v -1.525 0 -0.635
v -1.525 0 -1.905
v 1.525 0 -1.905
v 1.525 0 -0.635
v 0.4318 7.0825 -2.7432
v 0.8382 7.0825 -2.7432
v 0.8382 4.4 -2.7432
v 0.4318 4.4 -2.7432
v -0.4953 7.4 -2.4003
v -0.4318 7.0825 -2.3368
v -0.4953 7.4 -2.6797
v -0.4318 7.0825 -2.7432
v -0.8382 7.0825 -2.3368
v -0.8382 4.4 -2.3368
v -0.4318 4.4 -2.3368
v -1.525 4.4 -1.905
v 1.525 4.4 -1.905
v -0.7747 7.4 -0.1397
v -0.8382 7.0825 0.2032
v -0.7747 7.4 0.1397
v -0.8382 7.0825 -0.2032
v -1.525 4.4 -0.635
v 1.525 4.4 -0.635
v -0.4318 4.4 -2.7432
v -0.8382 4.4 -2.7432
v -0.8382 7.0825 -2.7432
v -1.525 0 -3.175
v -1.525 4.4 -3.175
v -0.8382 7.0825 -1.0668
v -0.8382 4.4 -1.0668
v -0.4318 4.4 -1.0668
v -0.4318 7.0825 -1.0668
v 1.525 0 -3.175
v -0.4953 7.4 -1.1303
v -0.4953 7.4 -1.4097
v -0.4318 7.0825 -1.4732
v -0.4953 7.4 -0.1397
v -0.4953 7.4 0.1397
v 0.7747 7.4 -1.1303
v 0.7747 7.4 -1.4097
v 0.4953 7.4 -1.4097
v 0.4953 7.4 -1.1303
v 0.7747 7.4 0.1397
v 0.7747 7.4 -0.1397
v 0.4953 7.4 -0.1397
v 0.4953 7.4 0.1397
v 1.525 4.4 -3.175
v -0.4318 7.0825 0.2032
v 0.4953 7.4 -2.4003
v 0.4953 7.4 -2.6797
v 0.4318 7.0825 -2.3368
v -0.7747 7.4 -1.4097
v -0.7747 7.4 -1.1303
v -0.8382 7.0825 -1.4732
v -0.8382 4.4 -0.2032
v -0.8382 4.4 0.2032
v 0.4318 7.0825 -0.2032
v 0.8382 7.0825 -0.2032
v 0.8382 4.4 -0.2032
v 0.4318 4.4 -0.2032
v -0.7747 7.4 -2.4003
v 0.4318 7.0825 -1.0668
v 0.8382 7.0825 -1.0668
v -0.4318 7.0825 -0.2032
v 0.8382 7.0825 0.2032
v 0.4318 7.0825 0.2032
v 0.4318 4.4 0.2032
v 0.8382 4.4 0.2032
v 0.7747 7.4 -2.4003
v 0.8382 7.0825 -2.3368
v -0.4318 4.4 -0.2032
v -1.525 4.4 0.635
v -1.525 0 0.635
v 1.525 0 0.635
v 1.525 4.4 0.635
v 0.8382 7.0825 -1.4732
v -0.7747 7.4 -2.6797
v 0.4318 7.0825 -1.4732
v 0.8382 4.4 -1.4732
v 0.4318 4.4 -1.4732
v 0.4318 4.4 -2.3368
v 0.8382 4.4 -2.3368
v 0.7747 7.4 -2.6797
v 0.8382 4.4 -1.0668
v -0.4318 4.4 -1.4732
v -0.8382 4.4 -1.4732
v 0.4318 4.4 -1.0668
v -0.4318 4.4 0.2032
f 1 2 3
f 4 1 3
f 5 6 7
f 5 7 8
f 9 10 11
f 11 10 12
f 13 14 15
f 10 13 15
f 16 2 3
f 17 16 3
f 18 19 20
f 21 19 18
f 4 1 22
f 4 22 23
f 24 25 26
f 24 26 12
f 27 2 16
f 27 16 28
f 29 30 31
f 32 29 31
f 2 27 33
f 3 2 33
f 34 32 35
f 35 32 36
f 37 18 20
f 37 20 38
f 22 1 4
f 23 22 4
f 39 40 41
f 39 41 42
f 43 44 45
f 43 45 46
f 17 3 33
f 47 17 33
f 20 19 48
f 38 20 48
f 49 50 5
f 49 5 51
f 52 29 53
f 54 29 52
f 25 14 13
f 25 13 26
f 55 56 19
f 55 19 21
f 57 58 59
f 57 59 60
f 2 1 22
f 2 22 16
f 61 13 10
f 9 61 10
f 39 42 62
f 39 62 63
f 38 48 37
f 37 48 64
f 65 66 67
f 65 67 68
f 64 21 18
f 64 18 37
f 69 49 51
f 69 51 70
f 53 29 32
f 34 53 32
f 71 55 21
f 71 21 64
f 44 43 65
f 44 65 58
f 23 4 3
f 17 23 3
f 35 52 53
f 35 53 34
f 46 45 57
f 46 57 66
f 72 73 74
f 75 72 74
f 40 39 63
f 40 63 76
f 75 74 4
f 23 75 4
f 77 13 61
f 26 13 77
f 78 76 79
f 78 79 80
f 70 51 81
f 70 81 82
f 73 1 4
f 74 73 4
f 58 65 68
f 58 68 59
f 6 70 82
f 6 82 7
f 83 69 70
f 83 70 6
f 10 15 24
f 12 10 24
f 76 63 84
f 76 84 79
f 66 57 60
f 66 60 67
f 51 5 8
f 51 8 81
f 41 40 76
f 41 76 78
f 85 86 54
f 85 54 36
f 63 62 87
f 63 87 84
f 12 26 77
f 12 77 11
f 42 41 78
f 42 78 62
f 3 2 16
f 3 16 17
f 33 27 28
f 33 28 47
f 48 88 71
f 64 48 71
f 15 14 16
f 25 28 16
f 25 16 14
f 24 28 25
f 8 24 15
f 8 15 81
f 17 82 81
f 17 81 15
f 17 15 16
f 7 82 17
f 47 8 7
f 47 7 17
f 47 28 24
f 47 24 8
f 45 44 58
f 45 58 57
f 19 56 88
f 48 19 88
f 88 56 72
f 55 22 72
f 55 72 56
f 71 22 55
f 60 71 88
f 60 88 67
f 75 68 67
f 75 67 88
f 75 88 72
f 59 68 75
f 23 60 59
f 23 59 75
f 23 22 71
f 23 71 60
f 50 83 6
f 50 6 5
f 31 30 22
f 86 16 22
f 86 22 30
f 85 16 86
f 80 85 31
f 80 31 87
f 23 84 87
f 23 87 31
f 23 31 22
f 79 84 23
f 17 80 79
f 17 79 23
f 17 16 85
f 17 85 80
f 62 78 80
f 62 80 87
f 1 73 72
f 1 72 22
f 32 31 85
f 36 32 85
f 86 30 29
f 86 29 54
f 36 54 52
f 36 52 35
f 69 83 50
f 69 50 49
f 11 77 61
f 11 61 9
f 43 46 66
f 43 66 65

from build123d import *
from OCP.BRepFilletAPI import BRepFilletAPI_MakeChamfer

# Parameters (mm, degrees)
SKETCH1_W           = 3.05
SKETCH1_H           = 1.27
BOSS_EXTRUDE2_DEPTH = 4.4
SWEEP5_START        = 4.4
SWEEP5_OUTLINE_W    = 0.4064
SWEEP5_OUTLINE_H    = 0.4064
SWEEP5_DEPTH        = 3
SKETCH6_W           = 0.4064
SKETCH6_H           = 0.4064
CHAMFER1_SIZE       = 0.0635
CHAMFER1_SIZE2      = 0.3175
CHAMFER2_SIZE       = 0.3175
CHAMFER2_SIZE2      = 0.0635
LPATTERN1_COUNT     = 3
LPATTERN1_PITCH     = 1.27


# Read off the part's stored shape, not the designer's step: Sweep5
with BuildPart() as part:
    # Sketch1 → Boss-Extrude2 (new body)
    with BuildSketch(Plane(origin=(0, 0, 0), x_dir=(1, 0, 0), z_dir=(0, 1, 0))):
        Rectangle(SKETCH1_W, SKETCH1_H)
    extrude(amount=BOSS_EXTRUDE2_DEPTH)

    # Sweep5 outline → Sweep5 (add)
    with BuildSketch(Plane(origin=(0, 0, 0), x_dir=(1, 0, 0), z_dir=(0, 1, 0)).offset(SWEEP5_START)):
        with Locations((-0.635, 0)):
            Rectangle(SWEEP5_OUTLINE_W, SWEEP5_OUTLINE_H)
    extrude(amount=SWEEP5_DEPTH)

    # Sweep6: sweep along a path in Sketch7
    with BuildLine(Plane.XY) as sweep6_path:
        Line((0.635, 4.4), (0.635, 7.4))
    # Sketch6 → Sweep6 (sweep)
    with BuildSketch(Plane(origin=(0, 7.4, 0), x_dir=(1, 0, 0), z_dir=(0, 1, 0))):
        with Locations((0.635, 0)):
            Rectangle(SKETCH6_W, SKETCH6_H)
    sweep(path=sweep6_path.line)

    # Chamfer1
    chamfer1_edges = [part.edges().sort_by_distance(p)[0] for p in [
        (-0.635, 7.4, -0.2032),
        (-0.4318, 7.4, 0),
        (-0.635, 7.4, 0.2032),
        (-0.8382, 7.4, 0),
    ]]
    chamfer1_side = [part.faces().sort_by_distance(p)[0] for p in [
        (-0.635, 7.4, 0),
    ]]
    chamfer(chamfer1_edges, length=CHAMFER1_SIZE, length2=CHAMFER1_SIZE2, reference=chamfer1_side[0])

    # Chamfer2: one chamfer whose edges measure the first distance from different faces: ONE call of the kernel's chamfer builder (chamfer() names one face for all edges)
    chamfer2_edges_1 = [part.edges().sort_by_distance(p)[0] for p in [
        (0.8382, 7.4, 0),
    ]]
    chamfer2_side_1 = [part.faces().sort_by_distance(p)[0] for p in [
        (0.8382, 5.9, 0),
    ]]
    chamfer2_edges_2 = [part.edges().sort_by_distance(p)[0] for p in [
        (0.635, 7.4, -0.2032),
    ]]
    chamfer2_side_2 = [part.faces().sort_by_distance(p)[0] for p in [
        (0.635, 5.9, -0.2032),
    ]]
    chamfer2_edges_3 = [part.edges().sort_by_distance(p)[0] for p in [
        (0.4318, 7.4, 0),
    ]]
    chamfer2_side_3 = [part.faces().sort_by_distance(p)[0] for p in [
        (0.4318, 5.9, 0),
    ]]
    chamfer2_edges_4 = [part.edges().sort_by_distance(p)[0] for p in [
        (0.635, 7.4, 0.2032),
    ]]
    chamfer2_side_4 = [part.faces().sort_by_distance(p)[0] for p in [
        (0.635, 5.9, 0.2032),
    ]]
    chamfer2 = BRepFilletAPI_MakeChamfer(part.part.solid().wrapped)
    for e in chamfer2_edges_1:
        chamfer2.Add(CHAMFER2_SIZE, CHAMFER2_SIZE2, e.wrapped, chamfer2_side_1[0].wrapped)  # the first distance lies on this face
    for e in chamfer2_edges_2:
        chamfer2.Add(CHAMFER2_SIZE, CHAMFER2_SIZE2, e.wrapped, chamfer2_side_2[0].wrapped)  # the first distance lies on this face
    for e in chamfer2_edges_3:
        chamfer2.Add(CHAMFER2_SIZE, CHAMFER2_SIZE2, e.wrapped, chamfer2_side_3[0].wrapped)  # the first distance lies on this face
    for e in chamfer2_edges_4:
        chamfer2.Add(CHAMFER2_SIZE, CHAMFER2_SIZE2, e.wrapped, chamfer2_side_4[0].wrapped)  # the first distance lies on this face
    add(Compound.cast(chamfer2.Shape()), mode=Mode.REPLACE)


with BuildPart() as lpattern1_1:
    # LPattern1: pattern copy
    add(part.part.moved(Location(Vector(0, 0, -1) * (1 * LPATTERN1_PITCH))))


with BuildPart() as lpattern1_2:
    # LPattern1: pattern copy
    add(part.part.moved(Location(Vector(0, 0, -1) * (2 * LPATTERN1_PITCH))))


solid = Compound([part.part, lpattern1_1.part, lpattern1_2.part])
